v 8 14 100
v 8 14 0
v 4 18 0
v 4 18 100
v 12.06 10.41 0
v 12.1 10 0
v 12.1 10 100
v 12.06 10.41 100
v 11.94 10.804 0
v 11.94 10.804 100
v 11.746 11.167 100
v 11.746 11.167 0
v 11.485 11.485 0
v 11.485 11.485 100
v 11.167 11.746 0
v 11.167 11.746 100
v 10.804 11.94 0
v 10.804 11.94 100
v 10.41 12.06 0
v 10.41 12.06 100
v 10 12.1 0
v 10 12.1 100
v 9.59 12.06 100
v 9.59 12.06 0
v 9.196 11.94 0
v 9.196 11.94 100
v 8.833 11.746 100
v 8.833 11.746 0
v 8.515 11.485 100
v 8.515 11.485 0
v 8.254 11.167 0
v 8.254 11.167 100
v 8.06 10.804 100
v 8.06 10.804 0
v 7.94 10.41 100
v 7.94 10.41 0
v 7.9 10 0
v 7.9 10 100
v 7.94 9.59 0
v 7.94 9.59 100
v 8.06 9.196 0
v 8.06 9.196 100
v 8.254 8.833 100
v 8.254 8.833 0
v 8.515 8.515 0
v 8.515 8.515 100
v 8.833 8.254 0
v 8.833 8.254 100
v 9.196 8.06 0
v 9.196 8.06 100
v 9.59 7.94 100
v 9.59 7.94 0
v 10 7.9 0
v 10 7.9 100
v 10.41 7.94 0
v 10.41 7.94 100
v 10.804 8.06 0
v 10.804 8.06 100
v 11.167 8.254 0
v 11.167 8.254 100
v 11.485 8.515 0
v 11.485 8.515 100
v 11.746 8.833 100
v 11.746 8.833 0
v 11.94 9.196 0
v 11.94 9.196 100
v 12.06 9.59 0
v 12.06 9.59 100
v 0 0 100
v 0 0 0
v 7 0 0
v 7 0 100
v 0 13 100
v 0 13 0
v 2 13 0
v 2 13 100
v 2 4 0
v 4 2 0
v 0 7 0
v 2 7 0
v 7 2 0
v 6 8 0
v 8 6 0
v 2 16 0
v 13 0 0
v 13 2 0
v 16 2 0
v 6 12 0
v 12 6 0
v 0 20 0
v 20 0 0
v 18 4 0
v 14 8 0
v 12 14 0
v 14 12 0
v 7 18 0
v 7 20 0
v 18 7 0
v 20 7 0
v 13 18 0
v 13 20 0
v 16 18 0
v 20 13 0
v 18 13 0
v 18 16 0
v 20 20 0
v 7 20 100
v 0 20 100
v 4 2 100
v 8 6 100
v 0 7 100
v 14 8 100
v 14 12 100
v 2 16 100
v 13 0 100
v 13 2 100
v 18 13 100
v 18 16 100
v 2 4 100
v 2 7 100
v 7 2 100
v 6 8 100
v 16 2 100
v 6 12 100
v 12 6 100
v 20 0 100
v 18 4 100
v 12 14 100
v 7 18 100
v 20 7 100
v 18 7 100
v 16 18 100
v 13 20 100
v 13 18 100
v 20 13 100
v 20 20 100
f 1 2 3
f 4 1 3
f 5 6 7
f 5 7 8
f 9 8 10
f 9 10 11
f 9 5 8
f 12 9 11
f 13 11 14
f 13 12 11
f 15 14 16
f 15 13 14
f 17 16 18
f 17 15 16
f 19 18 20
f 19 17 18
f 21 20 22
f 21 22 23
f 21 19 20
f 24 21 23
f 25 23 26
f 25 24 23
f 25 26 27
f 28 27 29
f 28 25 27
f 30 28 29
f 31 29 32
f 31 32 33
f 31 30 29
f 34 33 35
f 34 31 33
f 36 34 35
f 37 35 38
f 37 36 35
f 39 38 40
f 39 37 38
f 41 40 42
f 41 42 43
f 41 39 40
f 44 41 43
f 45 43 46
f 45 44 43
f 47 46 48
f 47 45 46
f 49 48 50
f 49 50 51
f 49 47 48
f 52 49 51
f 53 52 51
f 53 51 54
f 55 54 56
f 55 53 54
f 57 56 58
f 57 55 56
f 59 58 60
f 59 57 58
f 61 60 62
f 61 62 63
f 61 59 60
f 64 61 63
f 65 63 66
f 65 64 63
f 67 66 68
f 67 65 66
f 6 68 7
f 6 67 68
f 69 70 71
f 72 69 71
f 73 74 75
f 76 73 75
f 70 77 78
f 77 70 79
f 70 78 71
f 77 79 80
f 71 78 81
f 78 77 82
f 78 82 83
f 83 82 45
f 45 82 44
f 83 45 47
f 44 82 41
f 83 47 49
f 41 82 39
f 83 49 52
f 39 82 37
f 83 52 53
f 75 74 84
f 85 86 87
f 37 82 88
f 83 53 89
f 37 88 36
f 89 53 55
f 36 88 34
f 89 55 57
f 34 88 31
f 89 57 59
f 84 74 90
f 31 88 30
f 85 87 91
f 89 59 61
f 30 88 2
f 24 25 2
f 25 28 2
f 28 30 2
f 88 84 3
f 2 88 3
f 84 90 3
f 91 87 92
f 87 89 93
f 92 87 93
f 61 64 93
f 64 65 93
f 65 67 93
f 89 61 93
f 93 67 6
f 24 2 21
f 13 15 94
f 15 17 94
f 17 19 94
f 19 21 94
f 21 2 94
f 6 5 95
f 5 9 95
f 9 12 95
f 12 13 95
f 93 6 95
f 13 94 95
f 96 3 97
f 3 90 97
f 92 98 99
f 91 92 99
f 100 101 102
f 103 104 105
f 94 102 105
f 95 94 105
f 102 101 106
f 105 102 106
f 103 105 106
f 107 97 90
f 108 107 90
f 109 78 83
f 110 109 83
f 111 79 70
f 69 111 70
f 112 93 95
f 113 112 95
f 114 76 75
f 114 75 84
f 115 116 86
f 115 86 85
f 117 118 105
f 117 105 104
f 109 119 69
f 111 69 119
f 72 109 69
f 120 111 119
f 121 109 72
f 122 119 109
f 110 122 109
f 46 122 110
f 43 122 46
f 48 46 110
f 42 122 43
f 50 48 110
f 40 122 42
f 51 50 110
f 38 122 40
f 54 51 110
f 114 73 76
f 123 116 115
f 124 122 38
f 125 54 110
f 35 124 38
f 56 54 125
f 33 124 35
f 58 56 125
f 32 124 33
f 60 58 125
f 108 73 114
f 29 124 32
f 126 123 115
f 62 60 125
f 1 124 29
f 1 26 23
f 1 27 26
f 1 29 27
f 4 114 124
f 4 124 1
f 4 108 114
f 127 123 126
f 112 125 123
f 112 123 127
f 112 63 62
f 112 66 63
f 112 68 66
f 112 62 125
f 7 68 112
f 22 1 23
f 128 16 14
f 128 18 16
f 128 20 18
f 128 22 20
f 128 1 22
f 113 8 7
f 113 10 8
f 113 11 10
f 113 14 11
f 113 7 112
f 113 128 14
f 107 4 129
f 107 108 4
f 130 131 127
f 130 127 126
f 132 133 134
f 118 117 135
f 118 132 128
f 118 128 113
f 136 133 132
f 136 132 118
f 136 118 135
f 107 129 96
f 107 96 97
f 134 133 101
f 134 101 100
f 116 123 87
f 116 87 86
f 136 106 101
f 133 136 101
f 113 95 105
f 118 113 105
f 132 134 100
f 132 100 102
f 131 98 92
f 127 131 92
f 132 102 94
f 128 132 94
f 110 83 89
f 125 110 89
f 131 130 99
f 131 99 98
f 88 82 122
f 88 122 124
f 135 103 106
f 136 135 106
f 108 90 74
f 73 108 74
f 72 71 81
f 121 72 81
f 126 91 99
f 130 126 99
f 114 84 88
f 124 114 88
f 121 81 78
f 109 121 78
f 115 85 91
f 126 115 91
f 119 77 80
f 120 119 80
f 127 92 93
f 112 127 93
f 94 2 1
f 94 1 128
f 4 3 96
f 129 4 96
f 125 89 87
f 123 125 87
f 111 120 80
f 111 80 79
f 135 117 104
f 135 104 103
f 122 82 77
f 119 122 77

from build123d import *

# Parameters (mm, degrees)
SKETCH1_W           = 8
SKETCH1_H           = 8
SKETCH1_R           = 2.1
BOSS_EXTRUDE1_DEPTH = 100


with BuildPart() as part:
    # Sketch1 → Boss-Extrude1 (new body)
    # profile 1 of 5: a face of its own
    with BuildSketch(Plane.XY):
        Polygon((2, 16), (6, 12), (6, 14), (8, 14), (4, 18), (7, 18), (7, 20), (0, 20), (0, 13), (2, 13), align=None)
    # profile 2 of 5: a face of its own
    with BuildSketch(Plane.XY):
        Polygon((16, 18), (12, 14), (14, 14), (14, 12), (18, 16), (18, 13), (20, 13), (20, 20), (13, 20), (13, 18), align=None)
    # profile 3 of 5: a face of its own
    with BuildSketch(Plane.XY):
        with Locations((10, 10)):
            Rectangle(SKETCH1_W, SKETCH1_H)
        with Locations((10, 10)):
            Circle(SKETCH1_R, mode=Mode.SUBTRACT)
    # profile 4 of 5: a face of its own
    with BuildSketch(Plane.XY):
        Polygon((6, 8), (2, 4), (2, 7), (0, 7), (0, 0), (7, 0), (7, 2), (4, 2), (8, 6), (6, 6), align=None)
    # profile 5 of 5: a face of its own
    with BuildSketch(Plane.XY):
        Polygon((14, 6), (12, 6), (16, 2), (13, 2), (13, 0), (20, 0), (20, 7), (18, 7), (18, 4), (14, 8), align=None)
    extrude(amount=BOSS_EXTRUDE1_DEPTH)


solid = part.part
